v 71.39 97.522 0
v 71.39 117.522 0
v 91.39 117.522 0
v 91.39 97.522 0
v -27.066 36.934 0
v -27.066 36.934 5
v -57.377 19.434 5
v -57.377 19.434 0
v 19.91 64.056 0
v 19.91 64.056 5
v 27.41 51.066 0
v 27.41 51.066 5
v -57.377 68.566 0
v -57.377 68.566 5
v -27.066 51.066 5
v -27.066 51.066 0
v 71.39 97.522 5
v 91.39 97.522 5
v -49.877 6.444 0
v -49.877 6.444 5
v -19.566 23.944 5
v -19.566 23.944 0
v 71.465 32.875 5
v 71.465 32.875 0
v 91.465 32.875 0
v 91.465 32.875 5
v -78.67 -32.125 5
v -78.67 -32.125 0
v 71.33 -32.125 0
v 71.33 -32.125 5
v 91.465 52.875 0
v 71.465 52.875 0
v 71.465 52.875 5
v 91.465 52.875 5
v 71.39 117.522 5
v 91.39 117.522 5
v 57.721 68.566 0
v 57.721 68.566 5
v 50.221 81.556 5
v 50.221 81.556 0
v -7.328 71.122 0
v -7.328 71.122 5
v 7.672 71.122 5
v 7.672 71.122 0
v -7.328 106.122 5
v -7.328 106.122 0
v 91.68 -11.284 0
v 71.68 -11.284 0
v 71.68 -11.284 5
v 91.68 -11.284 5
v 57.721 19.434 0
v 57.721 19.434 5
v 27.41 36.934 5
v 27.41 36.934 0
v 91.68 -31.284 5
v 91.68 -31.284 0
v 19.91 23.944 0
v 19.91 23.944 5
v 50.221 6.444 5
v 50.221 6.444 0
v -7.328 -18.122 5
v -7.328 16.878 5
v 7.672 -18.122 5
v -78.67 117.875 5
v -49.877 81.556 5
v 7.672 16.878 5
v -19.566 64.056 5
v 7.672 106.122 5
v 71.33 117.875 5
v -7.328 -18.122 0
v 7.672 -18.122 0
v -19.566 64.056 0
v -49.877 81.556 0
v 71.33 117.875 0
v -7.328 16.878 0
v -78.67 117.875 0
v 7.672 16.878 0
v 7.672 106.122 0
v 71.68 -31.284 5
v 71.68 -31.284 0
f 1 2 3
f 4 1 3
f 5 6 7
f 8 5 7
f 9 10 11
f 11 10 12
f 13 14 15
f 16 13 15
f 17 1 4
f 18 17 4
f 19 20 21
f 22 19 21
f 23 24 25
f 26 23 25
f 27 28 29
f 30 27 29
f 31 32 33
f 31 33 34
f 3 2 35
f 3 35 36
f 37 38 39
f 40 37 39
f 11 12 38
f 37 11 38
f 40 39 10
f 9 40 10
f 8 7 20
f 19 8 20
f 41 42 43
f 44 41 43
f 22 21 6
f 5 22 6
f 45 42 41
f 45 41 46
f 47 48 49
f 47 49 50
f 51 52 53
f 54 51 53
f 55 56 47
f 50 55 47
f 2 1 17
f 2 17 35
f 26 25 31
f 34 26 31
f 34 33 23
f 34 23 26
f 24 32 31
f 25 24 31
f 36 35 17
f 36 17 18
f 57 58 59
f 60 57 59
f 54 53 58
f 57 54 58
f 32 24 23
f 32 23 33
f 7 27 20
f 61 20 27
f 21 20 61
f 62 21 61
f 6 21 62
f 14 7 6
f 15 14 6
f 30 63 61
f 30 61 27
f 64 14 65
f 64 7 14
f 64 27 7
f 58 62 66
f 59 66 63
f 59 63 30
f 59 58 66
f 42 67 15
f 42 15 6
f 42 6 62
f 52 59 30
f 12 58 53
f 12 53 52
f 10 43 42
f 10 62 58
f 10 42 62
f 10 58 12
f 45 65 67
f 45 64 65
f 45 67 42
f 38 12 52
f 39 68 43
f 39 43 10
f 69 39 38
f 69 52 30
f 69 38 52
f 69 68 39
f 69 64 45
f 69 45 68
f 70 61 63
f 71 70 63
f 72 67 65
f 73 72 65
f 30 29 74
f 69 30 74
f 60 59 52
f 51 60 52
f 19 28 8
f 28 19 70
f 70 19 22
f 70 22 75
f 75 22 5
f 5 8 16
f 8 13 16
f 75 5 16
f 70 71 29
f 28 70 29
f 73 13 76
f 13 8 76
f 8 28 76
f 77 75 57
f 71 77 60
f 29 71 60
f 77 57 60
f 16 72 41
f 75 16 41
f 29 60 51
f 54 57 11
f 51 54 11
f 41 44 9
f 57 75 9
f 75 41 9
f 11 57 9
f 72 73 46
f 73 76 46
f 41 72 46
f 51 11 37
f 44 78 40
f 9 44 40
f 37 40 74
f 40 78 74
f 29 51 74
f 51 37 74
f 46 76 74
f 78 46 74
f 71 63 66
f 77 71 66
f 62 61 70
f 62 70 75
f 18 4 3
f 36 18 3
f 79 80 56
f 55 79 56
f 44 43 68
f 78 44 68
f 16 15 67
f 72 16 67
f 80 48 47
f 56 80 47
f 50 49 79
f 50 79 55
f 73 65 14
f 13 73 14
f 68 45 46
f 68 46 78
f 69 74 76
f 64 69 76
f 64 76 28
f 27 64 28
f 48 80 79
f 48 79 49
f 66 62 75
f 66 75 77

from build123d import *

# Parameters (mm, degrees)
F0_W     = 20
F0_H     = 20
F1_DEPTH = 5
F2_W     = 15
F2_H     = 35
F3_DEPTH = 62


with BuildPart() as f1:
    # F0 (on Top) → F1 (new body)
    with BuildSketch(Plane.XY):
        Polygon((71.329683, 117.875477), (-78.670317, 117.875477), (-78.670317, -32.124523), (71.329683, -32.124523), (71.329683, 52.875477), align=None)
        with Locations((81.680194, -21.283627)):
            Rectangle(F0_W, F0_H)
        with Locations((81.465252, 42.875477)):
            Rectangle(F0_W, F0_H)
        with Locations((81.390066, 107.521837)):
            Rectangle(F0_W, F0_H)
    extrude(amount=F1_DEPTH)

    # F2 (on face) → F3 (cut)
    with BuildSketch(Plane.XY.offset(5)):
        with Locations((0.172052, -0.621775)):
            Rectangle(F2_W, F2_H)
        Polygon((27.410198, 36.934303), (19.910198, 23.943922), (50.221087, 6.443922), (57.721087, 19.434303), align=None)
        Polygon((19.910198, 64.056078), (27.410198, 51.065697), (57.721087, 68.565697), (50.221087, 81.556078), align=None)
        with Locations((0.172052, 88.621775)):
            Rectangle(F2_W, F2_H)
        Polygon((-27.066095, 51.065697), (-19.566095, 64.056078), (-49.876984, 81.556078), (-57.376984, 68.565697), align=None)
        Polygon((-19.566095, 23.943922), (-27.066095, 36.934303), (-57.376984, 19.434303), (-49.876984, 6.443922), align=None)
    extrude(amount=-F3_DEPTH, mode=Mode.SUBTRACT)


solid = f1.part
